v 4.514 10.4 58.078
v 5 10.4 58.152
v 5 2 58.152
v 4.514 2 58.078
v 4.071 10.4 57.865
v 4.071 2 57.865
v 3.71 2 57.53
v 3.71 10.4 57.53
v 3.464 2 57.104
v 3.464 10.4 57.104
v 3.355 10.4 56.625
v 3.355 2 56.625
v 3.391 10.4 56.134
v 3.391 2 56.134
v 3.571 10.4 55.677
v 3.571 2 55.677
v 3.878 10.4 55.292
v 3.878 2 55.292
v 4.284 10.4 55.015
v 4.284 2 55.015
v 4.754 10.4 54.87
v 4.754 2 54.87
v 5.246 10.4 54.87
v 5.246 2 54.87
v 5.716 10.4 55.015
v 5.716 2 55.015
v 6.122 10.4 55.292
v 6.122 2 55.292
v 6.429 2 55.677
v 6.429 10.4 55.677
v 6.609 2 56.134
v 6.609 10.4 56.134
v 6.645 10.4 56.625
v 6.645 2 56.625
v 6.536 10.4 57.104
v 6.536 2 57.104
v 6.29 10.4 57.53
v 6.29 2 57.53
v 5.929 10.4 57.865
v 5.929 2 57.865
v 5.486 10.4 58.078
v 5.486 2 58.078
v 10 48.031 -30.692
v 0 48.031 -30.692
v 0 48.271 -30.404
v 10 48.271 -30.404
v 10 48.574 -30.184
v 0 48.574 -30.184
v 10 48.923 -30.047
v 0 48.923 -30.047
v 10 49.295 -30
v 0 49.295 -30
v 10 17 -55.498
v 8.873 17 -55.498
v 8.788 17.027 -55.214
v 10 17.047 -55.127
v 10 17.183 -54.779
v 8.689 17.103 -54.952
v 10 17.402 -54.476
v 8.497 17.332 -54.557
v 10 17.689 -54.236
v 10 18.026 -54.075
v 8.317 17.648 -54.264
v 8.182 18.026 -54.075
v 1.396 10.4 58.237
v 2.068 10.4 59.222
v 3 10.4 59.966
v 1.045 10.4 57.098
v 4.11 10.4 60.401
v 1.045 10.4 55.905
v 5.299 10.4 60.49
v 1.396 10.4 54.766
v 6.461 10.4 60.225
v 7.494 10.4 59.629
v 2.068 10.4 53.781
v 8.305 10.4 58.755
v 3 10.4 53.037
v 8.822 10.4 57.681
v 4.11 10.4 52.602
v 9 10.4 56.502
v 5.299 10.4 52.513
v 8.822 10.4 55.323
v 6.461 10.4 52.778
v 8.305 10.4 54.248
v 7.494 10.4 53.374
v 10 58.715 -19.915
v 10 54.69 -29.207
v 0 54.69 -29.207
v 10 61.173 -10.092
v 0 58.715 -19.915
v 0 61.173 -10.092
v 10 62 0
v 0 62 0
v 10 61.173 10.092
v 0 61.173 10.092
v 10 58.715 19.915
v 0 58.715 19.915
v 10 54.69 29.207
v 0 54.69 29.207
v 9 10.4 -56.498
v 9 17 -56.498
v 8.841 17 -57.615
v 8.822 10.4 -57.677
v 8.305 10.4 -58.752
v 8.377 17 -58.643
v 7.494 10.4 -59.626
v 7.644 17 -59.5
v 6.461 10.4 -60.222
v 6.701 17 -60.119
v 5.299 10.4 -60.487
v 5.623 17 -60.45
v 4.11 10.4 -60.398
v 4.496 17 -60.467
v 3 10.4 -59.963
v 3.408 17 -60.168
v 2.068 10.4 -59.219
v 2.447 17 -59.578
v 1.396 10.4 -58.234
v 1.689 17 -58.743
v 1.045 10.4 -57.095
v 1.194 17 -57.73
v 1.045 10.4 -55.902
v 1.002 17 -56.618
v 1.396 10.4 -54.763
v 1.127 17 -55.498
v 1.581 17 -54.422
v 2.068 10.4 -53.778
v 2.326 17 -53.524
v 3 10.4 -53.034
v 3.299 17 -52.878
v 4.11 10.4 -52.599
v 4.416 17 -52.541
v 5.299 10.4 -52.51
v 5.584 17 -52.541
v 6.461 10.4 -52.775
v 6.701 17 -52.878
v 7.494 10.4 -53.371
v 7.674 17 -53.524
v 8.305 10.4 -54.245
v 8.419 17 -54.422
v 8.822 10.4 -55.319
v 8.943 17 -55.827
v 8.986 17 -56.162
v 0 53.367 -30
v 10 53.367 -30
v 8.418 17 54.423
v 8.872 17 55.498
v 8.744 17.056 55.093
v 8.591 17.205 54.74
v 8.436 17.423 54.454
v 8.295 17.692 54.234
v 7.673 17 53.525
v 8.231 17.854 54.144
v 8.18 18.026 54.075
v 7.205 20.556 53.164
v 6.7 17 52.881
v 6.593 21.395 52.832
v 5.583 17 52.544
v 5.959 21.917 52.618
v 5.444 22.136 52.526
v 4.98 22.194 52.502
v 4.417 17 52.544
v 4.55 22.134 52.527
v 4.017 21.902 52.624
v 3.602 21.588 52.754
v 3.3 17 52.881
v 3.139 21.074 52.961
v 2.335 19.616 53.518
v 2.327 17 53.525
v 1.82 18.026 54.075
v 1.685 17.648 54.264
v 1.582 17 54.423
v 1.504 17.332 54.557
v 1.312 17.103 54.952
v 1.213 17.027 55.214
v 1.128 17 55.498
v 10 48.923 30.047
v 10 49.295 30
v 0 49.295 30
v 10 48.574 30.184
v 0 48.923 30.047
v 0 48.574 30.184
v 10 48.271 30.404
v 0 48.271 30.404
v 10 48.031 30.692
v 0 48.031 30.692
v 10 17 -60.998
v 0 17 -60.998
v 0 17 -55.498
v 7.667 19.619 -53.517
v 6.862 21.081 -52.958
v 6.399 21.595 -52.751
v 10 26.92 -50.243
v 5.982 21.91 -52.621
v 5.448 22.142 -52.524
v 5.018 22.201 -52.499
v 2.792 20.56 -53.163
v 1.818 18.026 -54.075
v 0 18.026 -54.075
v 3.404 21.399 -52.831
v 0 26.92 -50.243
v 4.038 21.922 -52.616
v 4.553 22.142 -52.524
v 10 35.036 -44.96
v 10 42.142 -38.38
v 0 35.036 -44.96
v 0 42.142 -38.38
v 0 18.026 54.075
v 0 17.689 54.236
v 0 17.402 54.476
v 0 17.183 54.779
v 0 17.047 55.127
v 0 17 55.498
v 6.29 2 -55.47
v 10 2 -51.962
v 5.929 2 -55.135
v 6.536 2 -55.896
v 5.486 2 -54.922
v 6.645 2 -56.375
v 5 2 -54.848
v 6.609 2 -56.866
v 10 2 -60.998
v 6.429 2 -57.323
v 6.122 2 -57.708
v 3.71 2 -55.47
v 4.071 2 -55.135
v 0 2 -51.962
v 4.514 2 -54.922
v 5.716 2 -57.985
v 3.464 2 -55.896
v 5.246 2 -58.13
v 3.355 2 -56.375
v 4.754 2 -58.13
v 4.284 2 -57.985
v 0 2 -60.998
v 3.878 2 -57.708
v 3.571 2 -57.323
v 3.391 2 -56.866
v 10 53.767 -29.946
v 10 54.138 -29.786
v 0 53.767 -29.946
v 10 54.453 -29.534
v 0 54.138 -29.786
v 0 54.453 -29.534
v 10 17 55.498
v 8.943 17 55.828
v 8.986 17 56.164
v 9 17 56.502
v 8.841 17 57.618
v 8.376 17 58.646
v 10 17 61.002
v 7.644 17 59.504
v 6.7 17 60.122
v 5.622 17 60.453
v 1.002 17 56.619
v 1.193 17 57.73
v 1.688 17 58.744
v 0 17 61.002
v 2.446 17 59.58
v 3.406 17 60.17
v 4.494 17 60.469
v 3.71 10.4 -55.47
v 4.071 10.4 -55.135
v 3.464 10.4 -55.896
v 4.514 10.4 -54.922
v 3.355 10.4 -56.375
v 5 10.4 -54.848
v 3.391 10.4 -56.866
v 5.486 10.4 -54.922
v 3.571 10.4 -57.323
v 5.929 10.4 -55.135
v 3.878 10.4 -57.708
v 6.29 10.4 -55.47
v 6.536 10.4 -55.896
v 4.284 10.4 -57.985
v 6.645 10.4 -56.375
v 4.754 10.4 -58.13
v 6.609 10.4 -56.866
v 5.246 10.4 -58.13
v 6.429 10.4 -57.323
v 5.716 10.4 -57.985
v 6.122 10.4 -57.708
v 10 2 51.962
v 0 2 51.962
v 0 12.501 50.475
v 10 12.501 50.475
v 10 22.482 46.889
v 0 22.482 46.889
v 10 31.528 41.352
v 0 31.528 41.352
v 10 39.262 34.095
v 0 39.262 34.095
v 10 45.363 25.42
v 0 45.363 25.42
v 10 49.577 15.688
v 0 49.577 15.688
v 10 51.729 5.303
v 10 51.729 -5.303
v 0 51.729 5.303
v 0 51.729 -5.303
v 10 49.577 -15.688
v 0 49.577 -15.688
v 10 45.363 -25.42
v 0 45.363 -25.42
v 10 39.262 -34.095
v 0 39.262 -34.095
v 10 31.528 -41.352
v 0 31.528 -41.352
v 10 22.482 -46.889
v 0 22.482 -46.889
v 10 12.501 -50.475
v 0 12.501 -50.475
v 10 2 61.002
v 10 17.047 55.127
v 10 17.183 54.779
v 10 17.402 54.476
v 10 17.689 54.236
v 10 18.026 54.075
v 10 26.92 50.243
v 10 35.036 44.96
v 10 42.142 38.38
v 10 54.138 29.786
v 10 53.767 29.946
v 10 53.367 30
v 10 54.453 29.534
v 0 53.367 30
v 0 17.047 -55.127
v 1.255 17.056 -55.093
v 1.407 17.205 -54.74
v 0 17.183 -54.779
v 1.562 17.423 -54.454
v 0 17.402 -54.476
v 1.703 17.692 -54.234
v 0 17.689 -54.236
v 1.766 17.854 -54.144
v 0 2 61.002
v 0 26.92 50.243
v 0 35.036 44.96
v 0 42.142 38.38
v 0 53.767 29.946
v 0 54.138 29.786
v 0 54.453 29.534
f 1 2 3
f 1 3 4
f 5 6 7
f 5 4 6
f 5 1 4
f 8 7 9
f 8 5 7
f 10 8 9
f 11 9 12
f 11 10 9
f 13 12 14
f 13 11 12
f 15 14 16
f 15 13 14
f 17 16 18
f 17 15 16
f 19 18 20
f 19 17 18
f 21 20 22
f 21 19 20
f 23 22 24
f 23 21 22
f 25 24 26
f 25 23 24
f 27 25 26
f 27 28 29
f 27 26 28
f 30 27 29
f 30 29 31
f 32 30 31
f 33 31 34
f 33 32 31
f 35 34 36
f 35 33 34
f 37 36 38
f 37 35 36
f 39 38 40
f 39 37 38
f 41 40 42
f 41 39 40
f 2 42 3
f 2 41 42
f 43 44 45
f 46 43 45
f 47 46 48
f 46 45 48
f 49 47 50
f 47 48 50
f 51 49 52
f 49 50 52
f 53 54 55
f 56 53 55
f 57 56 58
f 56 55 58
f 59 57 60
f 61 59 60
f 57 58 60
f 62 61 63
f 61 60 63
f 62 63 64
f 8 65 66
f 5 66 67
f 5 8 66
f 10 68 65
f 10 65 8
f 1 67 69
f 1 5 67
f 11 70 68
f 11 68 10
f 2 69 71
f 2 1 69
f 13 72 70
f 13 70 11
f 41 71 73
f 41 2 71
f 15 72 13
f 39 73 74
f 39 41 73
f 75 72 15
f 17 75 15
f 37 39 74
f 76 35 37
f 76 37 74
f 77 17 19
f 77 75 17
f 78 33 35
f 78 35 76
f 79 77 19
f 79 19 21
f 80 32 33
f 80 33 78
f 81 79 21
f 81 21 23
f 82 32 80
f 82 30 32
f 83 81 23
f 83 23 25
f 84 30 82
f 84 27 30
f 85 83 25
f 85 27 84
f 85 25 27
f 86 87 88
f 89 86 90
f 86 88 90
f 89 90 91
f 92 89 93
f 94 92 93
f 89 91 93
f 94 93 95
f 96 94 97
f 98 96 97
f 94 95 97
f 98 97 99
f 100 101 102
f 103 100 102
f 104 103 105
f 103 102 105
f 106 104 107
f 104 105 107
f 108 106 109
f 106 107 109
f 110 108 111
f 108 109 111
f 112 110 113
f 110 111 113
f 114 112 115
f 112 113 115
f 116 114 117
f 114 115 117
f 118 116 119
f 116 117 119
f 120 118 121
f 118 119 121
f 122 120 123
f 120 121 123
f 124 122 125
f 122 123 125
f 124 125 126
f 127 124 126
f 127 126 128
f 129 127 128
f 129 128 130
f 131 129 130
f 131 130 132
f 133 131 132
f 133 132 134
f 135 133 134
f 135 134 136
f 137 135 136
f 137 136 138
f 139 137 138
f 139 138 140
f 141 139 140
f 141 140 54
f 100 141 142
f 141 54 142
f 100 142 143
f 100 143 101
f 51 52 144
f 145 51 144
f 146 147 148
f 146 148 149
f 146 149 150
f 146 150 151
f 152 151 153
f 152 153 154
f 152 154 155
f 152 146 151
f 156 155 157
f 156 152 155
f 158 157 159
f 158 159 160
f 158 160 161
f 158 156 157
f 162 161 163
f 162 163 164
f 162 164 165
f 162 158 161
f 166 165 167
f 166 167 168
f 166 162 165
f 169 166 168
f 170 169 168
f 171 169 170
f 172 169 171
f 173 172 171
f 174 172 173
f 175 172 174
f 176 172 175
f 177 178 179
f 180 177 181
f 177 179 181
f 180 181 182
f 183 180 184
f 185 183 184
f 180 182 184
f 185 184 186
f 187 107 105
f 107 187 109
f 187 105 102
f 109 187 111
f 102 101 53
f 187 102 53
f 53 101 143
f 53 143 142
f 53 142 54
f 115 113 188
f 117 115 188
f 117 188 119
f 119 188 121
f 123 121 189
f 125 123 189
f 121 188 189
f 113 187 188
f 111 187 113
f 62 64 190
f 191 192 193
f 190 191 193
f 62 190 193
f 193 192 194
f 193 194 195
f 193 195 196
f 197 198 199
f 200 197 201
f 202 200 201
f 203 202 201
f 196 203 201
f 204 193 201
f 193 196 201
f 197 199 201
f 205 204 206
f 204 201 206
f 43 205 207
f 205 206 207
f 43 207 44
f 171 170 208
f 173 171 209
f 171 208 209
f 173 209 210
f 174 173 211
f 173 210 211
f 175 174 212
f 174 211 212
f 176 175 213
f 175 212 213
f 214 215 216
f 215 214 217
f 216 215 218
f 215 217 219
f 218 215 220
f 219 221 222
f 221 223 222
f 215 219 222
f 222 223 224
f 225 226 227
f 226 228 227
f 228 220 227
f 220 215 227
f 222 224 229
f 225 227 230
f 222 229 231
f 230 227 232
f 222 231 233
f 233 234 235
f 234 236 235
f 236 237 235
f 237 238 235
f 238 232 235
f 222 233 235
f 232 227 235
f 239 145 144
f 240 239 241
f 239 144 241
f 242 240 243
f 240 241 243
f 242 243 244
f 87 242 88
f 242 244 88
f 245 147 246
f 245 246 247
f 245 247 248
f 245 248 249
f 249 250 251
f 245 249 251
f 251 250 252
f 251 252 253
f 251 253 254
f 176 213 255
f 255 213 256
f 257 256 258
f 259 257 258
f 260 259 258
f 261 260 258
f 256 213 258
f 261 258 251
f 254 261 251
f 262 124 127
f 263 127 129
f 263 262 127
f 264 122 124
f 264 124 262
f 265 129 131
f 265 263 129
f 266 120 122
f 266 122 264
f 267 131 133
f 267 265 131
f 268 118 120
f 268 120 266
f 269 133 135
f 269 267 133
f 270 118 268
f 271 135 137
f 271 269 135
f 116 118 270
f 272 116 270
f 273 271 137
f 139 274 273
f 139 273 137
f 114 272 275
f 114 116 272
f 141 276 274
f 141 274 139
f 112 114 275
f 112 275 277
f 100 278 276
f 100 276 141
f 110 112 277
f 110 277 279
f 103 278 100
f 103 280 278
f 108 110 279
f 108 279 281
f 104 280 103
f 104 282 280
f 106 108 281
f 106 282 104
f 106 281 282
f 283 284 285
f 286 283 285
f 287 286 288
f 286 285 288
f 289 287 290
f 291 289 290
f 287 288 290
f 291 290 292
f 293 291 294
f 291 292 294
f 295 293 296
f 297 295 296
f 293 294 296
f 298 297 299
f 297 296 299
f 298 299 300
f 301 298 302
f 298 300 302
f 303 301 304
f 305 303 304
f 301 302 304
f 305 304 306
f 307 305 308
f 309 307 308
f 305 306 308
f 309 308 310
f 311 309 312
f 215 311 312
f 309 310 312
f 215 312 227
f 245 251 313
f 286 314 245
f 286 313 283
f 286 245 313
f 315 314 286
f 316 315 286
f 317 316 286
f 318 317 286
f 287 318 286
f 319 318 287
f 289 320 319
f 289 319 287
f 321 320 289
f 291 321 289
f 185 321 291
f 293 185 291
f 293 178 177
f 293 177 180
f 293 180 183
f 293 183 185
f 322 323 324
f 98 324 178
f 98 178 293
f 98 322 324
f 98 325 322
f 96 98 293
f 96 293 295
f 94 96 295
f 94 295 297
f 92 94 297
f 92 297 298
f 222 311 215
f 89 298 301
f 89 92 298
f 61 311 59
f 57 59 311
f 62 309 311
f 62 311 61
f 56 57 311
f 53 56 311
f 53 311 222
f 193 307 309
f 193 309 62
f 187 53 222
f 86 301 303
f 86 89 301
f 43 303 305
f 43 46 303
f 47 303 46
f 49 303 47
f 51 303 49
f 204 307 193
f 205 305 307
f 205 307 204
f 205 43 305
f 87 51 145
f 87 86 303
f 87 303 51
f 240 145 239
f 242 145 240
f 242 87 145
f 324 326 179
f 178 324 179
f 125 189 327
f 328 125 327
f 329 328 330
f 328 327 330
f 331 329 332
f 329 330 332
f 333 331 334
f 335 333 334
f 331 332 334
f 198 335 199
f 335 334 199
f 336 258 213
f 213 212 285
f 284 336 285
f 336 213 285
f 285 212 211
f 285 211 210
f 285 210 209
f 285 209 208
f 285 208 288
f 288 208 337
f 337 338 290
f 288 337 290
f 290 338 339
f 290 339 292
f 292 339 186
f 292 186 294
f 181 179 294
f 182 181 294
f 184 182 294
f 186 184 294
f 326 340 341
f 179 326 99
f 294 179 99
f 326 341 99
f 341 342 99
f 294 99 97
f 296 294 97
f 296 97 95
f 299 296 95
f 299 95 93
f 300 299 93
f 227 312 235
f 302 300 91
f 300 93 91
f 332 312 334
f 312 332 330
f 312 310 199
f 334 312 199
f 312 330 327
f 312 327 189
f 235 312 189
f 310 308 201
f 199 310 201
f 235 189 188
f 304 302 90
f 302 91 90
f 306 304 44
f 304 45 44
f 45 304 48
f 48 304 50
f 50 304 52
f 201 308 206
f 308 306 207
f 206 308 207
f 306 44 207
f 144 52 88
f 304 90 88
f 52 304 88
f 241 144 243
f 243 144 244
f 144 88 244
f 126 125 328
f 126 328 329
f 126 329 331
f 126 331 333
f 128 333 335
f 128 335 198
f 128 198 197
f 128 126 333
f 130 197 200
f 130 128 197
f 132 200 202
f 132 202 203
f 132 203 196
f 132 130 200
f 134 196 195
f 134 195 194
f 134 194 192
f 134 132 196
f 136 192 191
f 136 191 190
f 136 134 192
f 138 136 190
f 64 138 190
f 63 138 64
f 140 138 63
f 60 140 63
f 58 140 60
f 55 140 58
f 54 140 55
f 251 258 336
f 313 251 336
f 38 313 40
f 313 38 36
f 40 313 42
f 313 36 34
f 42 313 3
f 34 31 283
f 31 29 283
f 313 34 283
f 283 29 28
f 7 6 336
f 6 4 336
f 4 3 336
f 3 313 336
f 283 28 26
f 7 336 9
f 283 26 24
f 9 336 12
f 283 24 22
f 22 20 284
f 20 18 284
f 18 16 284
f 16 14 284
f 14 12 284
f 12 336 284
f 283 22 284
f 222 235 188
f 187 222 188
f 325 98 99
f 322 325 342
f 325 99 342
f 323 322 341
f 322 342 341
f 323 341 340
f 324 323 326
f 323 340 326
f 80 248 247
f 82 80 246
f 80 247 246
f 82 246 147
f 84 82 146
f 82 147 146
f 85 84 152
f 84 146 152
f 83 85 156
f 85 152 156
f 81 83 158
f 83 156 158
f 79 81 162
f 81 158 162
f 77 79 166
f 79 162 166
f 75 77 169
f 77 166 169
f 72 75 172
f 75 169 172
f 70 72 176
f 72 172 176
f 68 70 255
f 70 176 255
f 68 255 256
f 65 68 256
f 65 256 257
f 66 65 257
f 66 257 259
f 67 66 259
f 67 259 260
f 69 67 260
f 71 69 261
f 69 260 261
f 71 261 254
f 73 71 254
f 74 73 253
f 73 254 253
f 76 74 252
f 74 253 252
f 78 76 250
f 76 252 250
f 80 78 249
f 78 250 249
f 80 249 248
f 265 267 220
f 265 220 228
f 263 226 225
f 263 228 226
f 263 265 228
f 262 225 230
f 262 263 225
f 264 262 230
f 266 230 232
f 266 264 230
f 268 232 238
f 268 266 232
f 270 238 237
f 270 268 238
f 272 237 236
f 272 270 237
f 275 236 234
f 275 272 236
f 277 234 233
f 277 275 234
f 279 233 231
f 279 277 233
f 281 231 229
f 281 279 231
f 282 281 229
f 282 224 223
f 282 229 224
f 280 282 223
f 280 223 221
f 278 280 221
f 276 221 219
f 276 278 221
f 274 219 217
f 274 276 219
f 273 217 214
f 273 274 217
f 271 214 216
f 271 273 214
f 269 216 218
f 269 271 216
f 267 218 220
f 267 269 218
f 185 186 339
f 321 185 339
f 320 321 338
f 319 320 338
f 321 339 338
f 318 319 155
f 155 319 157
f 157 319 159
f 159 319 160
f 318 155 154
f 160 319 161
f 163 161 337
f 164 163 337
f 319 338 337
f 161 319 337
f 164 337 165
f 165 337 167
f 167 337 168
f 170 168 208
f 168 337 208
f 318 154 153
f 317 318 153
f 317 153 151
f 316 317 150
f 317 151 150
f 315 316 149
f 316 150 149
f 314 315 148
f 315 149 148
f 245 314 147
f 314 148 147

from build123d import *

# Parameters (mm, degrees)
BOSS_EXTRUDE1_DEPTH        = 10
M4_TAPPED_HOLE1_AT_2_COUNT = 2
M4_TAPPED_HOLE1_AT_2_PITCH = 113
SKETCH7_R                  = 4
CUT_EXTRUDE1_DEPTH         = 10
CUT_EXTRUDE1_DEPTH_BACK    = 6.6


with BuildPart() as part:
    # Sketch1 → Boss-Extrude1 (new body)
    with BuildSketch(Plane(origin=(0, 0, 0), x_dir=(0, 0, -1), z_dir=(1, 0, 0))):
        with BuildLine():
            Line((-30, 53.366656257), (-30, 49.295030175))
            ThreePointArc((-30, 49.295030175), (-30.184412971, 48.574453483), (-30.692307692, 48.031055043))
            ThreePointArc((-30.692307692, 48.031055043), (-44.960469582, 35.036497755), (-54.07472853, 18.025641026))
            ThreePointArc((-54.07472853, 18.025641026), (-54.620689683, 17.283131383), (-55.497747702, 17))
            Line((-55.497747702, 17), (-61.001524227, 17))
            Line((-61.001524227, 17), (-61.001524227, 2))
            Line((-61.001524227, 2), (-51.961524227, 2))
            ThreePointArc((-51.961524227, 2), (0, 52), (51.961524227, 2))
            Line((51.961524227, 2), (60.998475773, 2))
            Line((60.998475773, 2), (60.998475773, 17))
            Line((60.998475773, 17), (55.497747702, 17))
            ThreePointArc((55.497747702, 17), (54.620689683, 17.283131383), (54.07472853, 18.025641026))
            ThreePointArc((54.07472853, 18.025641026), (44.960469582, 35.036497755), (30.692307692, 48.031055043))
            ThreePointArc((30.692307692, 48.031055043), (30.184412971, 48.574453483), (30, 49.295030175))
            Line((30, 49.295030175), (30, 53.366656257))
            ThreePointArc((30, 53.366656257), (29.786451973, 54.138045472), (29.20661157, 54.689796494))
            ThreePointArc((29.20661157, 54.689796494), (0, 62), (-29.20661157, 54.689796494))
            ThreePointArc((-29.20661157, 54.689796494), (-29.786451973, 54.138045472), (-30, 53.366656257))
        make_face()
    extrude(amount=BOSS_EXTRUDE1_DEPTH)

    # Sketch4 → M4 Tapped Hole1 (revolve, cut)
    with BuildSketch(Plane(origin=(5, 17, -56.498475773), x_dir=(0, 0, 1), z_dir=(1, 0, 0))):
        Polygon((0, 0), (0, 21.091420021), (1.65, 20.1), (1.65, 0), align=None)
    m4_tapped_hole1 = revolve(axis=Axis((5, 23.35, -56.498475773), (0, -1, 0)), mode=Mode.SUBTRACT)

    # M4 Tapped Hole1 at 2: M4 Tapped Hole1 ×2
    with Locations(*[(0, 0, i * M4_TAPPED_HOLE1_AT_2_PITCH) for i in range(1, M4_TAPPED_HOLE1_AT_2_COUNT)]):
        add(m4_tapped_hole1, mode=Mode.SUBTRACT)

    # Sketch7 → Cut-Extrude1 (cut, two sides)
    with BuildSketch(Plane(origin=(0, 17, 0), x_dir=(1, 0, 0), z_dir=(0, 1, 0))) as cut_extrude1_sk:
        with Locations((5, 56.498475773)):
            Circle(SKETCH7_R)
        with Locations((5, -56.501524227)):
            Circle(SKETCH7_R)
    extrude(amount=CUT_EXTRUDE1_DEPTH, mode=Mode.SUBTRACT)
    extrude(cut_extrude1_sk.sketch, amount=-CUT_EXTRUDE1_DEPTH_BACK, mode=Mode.SUBTRACT)


solid = part.part
